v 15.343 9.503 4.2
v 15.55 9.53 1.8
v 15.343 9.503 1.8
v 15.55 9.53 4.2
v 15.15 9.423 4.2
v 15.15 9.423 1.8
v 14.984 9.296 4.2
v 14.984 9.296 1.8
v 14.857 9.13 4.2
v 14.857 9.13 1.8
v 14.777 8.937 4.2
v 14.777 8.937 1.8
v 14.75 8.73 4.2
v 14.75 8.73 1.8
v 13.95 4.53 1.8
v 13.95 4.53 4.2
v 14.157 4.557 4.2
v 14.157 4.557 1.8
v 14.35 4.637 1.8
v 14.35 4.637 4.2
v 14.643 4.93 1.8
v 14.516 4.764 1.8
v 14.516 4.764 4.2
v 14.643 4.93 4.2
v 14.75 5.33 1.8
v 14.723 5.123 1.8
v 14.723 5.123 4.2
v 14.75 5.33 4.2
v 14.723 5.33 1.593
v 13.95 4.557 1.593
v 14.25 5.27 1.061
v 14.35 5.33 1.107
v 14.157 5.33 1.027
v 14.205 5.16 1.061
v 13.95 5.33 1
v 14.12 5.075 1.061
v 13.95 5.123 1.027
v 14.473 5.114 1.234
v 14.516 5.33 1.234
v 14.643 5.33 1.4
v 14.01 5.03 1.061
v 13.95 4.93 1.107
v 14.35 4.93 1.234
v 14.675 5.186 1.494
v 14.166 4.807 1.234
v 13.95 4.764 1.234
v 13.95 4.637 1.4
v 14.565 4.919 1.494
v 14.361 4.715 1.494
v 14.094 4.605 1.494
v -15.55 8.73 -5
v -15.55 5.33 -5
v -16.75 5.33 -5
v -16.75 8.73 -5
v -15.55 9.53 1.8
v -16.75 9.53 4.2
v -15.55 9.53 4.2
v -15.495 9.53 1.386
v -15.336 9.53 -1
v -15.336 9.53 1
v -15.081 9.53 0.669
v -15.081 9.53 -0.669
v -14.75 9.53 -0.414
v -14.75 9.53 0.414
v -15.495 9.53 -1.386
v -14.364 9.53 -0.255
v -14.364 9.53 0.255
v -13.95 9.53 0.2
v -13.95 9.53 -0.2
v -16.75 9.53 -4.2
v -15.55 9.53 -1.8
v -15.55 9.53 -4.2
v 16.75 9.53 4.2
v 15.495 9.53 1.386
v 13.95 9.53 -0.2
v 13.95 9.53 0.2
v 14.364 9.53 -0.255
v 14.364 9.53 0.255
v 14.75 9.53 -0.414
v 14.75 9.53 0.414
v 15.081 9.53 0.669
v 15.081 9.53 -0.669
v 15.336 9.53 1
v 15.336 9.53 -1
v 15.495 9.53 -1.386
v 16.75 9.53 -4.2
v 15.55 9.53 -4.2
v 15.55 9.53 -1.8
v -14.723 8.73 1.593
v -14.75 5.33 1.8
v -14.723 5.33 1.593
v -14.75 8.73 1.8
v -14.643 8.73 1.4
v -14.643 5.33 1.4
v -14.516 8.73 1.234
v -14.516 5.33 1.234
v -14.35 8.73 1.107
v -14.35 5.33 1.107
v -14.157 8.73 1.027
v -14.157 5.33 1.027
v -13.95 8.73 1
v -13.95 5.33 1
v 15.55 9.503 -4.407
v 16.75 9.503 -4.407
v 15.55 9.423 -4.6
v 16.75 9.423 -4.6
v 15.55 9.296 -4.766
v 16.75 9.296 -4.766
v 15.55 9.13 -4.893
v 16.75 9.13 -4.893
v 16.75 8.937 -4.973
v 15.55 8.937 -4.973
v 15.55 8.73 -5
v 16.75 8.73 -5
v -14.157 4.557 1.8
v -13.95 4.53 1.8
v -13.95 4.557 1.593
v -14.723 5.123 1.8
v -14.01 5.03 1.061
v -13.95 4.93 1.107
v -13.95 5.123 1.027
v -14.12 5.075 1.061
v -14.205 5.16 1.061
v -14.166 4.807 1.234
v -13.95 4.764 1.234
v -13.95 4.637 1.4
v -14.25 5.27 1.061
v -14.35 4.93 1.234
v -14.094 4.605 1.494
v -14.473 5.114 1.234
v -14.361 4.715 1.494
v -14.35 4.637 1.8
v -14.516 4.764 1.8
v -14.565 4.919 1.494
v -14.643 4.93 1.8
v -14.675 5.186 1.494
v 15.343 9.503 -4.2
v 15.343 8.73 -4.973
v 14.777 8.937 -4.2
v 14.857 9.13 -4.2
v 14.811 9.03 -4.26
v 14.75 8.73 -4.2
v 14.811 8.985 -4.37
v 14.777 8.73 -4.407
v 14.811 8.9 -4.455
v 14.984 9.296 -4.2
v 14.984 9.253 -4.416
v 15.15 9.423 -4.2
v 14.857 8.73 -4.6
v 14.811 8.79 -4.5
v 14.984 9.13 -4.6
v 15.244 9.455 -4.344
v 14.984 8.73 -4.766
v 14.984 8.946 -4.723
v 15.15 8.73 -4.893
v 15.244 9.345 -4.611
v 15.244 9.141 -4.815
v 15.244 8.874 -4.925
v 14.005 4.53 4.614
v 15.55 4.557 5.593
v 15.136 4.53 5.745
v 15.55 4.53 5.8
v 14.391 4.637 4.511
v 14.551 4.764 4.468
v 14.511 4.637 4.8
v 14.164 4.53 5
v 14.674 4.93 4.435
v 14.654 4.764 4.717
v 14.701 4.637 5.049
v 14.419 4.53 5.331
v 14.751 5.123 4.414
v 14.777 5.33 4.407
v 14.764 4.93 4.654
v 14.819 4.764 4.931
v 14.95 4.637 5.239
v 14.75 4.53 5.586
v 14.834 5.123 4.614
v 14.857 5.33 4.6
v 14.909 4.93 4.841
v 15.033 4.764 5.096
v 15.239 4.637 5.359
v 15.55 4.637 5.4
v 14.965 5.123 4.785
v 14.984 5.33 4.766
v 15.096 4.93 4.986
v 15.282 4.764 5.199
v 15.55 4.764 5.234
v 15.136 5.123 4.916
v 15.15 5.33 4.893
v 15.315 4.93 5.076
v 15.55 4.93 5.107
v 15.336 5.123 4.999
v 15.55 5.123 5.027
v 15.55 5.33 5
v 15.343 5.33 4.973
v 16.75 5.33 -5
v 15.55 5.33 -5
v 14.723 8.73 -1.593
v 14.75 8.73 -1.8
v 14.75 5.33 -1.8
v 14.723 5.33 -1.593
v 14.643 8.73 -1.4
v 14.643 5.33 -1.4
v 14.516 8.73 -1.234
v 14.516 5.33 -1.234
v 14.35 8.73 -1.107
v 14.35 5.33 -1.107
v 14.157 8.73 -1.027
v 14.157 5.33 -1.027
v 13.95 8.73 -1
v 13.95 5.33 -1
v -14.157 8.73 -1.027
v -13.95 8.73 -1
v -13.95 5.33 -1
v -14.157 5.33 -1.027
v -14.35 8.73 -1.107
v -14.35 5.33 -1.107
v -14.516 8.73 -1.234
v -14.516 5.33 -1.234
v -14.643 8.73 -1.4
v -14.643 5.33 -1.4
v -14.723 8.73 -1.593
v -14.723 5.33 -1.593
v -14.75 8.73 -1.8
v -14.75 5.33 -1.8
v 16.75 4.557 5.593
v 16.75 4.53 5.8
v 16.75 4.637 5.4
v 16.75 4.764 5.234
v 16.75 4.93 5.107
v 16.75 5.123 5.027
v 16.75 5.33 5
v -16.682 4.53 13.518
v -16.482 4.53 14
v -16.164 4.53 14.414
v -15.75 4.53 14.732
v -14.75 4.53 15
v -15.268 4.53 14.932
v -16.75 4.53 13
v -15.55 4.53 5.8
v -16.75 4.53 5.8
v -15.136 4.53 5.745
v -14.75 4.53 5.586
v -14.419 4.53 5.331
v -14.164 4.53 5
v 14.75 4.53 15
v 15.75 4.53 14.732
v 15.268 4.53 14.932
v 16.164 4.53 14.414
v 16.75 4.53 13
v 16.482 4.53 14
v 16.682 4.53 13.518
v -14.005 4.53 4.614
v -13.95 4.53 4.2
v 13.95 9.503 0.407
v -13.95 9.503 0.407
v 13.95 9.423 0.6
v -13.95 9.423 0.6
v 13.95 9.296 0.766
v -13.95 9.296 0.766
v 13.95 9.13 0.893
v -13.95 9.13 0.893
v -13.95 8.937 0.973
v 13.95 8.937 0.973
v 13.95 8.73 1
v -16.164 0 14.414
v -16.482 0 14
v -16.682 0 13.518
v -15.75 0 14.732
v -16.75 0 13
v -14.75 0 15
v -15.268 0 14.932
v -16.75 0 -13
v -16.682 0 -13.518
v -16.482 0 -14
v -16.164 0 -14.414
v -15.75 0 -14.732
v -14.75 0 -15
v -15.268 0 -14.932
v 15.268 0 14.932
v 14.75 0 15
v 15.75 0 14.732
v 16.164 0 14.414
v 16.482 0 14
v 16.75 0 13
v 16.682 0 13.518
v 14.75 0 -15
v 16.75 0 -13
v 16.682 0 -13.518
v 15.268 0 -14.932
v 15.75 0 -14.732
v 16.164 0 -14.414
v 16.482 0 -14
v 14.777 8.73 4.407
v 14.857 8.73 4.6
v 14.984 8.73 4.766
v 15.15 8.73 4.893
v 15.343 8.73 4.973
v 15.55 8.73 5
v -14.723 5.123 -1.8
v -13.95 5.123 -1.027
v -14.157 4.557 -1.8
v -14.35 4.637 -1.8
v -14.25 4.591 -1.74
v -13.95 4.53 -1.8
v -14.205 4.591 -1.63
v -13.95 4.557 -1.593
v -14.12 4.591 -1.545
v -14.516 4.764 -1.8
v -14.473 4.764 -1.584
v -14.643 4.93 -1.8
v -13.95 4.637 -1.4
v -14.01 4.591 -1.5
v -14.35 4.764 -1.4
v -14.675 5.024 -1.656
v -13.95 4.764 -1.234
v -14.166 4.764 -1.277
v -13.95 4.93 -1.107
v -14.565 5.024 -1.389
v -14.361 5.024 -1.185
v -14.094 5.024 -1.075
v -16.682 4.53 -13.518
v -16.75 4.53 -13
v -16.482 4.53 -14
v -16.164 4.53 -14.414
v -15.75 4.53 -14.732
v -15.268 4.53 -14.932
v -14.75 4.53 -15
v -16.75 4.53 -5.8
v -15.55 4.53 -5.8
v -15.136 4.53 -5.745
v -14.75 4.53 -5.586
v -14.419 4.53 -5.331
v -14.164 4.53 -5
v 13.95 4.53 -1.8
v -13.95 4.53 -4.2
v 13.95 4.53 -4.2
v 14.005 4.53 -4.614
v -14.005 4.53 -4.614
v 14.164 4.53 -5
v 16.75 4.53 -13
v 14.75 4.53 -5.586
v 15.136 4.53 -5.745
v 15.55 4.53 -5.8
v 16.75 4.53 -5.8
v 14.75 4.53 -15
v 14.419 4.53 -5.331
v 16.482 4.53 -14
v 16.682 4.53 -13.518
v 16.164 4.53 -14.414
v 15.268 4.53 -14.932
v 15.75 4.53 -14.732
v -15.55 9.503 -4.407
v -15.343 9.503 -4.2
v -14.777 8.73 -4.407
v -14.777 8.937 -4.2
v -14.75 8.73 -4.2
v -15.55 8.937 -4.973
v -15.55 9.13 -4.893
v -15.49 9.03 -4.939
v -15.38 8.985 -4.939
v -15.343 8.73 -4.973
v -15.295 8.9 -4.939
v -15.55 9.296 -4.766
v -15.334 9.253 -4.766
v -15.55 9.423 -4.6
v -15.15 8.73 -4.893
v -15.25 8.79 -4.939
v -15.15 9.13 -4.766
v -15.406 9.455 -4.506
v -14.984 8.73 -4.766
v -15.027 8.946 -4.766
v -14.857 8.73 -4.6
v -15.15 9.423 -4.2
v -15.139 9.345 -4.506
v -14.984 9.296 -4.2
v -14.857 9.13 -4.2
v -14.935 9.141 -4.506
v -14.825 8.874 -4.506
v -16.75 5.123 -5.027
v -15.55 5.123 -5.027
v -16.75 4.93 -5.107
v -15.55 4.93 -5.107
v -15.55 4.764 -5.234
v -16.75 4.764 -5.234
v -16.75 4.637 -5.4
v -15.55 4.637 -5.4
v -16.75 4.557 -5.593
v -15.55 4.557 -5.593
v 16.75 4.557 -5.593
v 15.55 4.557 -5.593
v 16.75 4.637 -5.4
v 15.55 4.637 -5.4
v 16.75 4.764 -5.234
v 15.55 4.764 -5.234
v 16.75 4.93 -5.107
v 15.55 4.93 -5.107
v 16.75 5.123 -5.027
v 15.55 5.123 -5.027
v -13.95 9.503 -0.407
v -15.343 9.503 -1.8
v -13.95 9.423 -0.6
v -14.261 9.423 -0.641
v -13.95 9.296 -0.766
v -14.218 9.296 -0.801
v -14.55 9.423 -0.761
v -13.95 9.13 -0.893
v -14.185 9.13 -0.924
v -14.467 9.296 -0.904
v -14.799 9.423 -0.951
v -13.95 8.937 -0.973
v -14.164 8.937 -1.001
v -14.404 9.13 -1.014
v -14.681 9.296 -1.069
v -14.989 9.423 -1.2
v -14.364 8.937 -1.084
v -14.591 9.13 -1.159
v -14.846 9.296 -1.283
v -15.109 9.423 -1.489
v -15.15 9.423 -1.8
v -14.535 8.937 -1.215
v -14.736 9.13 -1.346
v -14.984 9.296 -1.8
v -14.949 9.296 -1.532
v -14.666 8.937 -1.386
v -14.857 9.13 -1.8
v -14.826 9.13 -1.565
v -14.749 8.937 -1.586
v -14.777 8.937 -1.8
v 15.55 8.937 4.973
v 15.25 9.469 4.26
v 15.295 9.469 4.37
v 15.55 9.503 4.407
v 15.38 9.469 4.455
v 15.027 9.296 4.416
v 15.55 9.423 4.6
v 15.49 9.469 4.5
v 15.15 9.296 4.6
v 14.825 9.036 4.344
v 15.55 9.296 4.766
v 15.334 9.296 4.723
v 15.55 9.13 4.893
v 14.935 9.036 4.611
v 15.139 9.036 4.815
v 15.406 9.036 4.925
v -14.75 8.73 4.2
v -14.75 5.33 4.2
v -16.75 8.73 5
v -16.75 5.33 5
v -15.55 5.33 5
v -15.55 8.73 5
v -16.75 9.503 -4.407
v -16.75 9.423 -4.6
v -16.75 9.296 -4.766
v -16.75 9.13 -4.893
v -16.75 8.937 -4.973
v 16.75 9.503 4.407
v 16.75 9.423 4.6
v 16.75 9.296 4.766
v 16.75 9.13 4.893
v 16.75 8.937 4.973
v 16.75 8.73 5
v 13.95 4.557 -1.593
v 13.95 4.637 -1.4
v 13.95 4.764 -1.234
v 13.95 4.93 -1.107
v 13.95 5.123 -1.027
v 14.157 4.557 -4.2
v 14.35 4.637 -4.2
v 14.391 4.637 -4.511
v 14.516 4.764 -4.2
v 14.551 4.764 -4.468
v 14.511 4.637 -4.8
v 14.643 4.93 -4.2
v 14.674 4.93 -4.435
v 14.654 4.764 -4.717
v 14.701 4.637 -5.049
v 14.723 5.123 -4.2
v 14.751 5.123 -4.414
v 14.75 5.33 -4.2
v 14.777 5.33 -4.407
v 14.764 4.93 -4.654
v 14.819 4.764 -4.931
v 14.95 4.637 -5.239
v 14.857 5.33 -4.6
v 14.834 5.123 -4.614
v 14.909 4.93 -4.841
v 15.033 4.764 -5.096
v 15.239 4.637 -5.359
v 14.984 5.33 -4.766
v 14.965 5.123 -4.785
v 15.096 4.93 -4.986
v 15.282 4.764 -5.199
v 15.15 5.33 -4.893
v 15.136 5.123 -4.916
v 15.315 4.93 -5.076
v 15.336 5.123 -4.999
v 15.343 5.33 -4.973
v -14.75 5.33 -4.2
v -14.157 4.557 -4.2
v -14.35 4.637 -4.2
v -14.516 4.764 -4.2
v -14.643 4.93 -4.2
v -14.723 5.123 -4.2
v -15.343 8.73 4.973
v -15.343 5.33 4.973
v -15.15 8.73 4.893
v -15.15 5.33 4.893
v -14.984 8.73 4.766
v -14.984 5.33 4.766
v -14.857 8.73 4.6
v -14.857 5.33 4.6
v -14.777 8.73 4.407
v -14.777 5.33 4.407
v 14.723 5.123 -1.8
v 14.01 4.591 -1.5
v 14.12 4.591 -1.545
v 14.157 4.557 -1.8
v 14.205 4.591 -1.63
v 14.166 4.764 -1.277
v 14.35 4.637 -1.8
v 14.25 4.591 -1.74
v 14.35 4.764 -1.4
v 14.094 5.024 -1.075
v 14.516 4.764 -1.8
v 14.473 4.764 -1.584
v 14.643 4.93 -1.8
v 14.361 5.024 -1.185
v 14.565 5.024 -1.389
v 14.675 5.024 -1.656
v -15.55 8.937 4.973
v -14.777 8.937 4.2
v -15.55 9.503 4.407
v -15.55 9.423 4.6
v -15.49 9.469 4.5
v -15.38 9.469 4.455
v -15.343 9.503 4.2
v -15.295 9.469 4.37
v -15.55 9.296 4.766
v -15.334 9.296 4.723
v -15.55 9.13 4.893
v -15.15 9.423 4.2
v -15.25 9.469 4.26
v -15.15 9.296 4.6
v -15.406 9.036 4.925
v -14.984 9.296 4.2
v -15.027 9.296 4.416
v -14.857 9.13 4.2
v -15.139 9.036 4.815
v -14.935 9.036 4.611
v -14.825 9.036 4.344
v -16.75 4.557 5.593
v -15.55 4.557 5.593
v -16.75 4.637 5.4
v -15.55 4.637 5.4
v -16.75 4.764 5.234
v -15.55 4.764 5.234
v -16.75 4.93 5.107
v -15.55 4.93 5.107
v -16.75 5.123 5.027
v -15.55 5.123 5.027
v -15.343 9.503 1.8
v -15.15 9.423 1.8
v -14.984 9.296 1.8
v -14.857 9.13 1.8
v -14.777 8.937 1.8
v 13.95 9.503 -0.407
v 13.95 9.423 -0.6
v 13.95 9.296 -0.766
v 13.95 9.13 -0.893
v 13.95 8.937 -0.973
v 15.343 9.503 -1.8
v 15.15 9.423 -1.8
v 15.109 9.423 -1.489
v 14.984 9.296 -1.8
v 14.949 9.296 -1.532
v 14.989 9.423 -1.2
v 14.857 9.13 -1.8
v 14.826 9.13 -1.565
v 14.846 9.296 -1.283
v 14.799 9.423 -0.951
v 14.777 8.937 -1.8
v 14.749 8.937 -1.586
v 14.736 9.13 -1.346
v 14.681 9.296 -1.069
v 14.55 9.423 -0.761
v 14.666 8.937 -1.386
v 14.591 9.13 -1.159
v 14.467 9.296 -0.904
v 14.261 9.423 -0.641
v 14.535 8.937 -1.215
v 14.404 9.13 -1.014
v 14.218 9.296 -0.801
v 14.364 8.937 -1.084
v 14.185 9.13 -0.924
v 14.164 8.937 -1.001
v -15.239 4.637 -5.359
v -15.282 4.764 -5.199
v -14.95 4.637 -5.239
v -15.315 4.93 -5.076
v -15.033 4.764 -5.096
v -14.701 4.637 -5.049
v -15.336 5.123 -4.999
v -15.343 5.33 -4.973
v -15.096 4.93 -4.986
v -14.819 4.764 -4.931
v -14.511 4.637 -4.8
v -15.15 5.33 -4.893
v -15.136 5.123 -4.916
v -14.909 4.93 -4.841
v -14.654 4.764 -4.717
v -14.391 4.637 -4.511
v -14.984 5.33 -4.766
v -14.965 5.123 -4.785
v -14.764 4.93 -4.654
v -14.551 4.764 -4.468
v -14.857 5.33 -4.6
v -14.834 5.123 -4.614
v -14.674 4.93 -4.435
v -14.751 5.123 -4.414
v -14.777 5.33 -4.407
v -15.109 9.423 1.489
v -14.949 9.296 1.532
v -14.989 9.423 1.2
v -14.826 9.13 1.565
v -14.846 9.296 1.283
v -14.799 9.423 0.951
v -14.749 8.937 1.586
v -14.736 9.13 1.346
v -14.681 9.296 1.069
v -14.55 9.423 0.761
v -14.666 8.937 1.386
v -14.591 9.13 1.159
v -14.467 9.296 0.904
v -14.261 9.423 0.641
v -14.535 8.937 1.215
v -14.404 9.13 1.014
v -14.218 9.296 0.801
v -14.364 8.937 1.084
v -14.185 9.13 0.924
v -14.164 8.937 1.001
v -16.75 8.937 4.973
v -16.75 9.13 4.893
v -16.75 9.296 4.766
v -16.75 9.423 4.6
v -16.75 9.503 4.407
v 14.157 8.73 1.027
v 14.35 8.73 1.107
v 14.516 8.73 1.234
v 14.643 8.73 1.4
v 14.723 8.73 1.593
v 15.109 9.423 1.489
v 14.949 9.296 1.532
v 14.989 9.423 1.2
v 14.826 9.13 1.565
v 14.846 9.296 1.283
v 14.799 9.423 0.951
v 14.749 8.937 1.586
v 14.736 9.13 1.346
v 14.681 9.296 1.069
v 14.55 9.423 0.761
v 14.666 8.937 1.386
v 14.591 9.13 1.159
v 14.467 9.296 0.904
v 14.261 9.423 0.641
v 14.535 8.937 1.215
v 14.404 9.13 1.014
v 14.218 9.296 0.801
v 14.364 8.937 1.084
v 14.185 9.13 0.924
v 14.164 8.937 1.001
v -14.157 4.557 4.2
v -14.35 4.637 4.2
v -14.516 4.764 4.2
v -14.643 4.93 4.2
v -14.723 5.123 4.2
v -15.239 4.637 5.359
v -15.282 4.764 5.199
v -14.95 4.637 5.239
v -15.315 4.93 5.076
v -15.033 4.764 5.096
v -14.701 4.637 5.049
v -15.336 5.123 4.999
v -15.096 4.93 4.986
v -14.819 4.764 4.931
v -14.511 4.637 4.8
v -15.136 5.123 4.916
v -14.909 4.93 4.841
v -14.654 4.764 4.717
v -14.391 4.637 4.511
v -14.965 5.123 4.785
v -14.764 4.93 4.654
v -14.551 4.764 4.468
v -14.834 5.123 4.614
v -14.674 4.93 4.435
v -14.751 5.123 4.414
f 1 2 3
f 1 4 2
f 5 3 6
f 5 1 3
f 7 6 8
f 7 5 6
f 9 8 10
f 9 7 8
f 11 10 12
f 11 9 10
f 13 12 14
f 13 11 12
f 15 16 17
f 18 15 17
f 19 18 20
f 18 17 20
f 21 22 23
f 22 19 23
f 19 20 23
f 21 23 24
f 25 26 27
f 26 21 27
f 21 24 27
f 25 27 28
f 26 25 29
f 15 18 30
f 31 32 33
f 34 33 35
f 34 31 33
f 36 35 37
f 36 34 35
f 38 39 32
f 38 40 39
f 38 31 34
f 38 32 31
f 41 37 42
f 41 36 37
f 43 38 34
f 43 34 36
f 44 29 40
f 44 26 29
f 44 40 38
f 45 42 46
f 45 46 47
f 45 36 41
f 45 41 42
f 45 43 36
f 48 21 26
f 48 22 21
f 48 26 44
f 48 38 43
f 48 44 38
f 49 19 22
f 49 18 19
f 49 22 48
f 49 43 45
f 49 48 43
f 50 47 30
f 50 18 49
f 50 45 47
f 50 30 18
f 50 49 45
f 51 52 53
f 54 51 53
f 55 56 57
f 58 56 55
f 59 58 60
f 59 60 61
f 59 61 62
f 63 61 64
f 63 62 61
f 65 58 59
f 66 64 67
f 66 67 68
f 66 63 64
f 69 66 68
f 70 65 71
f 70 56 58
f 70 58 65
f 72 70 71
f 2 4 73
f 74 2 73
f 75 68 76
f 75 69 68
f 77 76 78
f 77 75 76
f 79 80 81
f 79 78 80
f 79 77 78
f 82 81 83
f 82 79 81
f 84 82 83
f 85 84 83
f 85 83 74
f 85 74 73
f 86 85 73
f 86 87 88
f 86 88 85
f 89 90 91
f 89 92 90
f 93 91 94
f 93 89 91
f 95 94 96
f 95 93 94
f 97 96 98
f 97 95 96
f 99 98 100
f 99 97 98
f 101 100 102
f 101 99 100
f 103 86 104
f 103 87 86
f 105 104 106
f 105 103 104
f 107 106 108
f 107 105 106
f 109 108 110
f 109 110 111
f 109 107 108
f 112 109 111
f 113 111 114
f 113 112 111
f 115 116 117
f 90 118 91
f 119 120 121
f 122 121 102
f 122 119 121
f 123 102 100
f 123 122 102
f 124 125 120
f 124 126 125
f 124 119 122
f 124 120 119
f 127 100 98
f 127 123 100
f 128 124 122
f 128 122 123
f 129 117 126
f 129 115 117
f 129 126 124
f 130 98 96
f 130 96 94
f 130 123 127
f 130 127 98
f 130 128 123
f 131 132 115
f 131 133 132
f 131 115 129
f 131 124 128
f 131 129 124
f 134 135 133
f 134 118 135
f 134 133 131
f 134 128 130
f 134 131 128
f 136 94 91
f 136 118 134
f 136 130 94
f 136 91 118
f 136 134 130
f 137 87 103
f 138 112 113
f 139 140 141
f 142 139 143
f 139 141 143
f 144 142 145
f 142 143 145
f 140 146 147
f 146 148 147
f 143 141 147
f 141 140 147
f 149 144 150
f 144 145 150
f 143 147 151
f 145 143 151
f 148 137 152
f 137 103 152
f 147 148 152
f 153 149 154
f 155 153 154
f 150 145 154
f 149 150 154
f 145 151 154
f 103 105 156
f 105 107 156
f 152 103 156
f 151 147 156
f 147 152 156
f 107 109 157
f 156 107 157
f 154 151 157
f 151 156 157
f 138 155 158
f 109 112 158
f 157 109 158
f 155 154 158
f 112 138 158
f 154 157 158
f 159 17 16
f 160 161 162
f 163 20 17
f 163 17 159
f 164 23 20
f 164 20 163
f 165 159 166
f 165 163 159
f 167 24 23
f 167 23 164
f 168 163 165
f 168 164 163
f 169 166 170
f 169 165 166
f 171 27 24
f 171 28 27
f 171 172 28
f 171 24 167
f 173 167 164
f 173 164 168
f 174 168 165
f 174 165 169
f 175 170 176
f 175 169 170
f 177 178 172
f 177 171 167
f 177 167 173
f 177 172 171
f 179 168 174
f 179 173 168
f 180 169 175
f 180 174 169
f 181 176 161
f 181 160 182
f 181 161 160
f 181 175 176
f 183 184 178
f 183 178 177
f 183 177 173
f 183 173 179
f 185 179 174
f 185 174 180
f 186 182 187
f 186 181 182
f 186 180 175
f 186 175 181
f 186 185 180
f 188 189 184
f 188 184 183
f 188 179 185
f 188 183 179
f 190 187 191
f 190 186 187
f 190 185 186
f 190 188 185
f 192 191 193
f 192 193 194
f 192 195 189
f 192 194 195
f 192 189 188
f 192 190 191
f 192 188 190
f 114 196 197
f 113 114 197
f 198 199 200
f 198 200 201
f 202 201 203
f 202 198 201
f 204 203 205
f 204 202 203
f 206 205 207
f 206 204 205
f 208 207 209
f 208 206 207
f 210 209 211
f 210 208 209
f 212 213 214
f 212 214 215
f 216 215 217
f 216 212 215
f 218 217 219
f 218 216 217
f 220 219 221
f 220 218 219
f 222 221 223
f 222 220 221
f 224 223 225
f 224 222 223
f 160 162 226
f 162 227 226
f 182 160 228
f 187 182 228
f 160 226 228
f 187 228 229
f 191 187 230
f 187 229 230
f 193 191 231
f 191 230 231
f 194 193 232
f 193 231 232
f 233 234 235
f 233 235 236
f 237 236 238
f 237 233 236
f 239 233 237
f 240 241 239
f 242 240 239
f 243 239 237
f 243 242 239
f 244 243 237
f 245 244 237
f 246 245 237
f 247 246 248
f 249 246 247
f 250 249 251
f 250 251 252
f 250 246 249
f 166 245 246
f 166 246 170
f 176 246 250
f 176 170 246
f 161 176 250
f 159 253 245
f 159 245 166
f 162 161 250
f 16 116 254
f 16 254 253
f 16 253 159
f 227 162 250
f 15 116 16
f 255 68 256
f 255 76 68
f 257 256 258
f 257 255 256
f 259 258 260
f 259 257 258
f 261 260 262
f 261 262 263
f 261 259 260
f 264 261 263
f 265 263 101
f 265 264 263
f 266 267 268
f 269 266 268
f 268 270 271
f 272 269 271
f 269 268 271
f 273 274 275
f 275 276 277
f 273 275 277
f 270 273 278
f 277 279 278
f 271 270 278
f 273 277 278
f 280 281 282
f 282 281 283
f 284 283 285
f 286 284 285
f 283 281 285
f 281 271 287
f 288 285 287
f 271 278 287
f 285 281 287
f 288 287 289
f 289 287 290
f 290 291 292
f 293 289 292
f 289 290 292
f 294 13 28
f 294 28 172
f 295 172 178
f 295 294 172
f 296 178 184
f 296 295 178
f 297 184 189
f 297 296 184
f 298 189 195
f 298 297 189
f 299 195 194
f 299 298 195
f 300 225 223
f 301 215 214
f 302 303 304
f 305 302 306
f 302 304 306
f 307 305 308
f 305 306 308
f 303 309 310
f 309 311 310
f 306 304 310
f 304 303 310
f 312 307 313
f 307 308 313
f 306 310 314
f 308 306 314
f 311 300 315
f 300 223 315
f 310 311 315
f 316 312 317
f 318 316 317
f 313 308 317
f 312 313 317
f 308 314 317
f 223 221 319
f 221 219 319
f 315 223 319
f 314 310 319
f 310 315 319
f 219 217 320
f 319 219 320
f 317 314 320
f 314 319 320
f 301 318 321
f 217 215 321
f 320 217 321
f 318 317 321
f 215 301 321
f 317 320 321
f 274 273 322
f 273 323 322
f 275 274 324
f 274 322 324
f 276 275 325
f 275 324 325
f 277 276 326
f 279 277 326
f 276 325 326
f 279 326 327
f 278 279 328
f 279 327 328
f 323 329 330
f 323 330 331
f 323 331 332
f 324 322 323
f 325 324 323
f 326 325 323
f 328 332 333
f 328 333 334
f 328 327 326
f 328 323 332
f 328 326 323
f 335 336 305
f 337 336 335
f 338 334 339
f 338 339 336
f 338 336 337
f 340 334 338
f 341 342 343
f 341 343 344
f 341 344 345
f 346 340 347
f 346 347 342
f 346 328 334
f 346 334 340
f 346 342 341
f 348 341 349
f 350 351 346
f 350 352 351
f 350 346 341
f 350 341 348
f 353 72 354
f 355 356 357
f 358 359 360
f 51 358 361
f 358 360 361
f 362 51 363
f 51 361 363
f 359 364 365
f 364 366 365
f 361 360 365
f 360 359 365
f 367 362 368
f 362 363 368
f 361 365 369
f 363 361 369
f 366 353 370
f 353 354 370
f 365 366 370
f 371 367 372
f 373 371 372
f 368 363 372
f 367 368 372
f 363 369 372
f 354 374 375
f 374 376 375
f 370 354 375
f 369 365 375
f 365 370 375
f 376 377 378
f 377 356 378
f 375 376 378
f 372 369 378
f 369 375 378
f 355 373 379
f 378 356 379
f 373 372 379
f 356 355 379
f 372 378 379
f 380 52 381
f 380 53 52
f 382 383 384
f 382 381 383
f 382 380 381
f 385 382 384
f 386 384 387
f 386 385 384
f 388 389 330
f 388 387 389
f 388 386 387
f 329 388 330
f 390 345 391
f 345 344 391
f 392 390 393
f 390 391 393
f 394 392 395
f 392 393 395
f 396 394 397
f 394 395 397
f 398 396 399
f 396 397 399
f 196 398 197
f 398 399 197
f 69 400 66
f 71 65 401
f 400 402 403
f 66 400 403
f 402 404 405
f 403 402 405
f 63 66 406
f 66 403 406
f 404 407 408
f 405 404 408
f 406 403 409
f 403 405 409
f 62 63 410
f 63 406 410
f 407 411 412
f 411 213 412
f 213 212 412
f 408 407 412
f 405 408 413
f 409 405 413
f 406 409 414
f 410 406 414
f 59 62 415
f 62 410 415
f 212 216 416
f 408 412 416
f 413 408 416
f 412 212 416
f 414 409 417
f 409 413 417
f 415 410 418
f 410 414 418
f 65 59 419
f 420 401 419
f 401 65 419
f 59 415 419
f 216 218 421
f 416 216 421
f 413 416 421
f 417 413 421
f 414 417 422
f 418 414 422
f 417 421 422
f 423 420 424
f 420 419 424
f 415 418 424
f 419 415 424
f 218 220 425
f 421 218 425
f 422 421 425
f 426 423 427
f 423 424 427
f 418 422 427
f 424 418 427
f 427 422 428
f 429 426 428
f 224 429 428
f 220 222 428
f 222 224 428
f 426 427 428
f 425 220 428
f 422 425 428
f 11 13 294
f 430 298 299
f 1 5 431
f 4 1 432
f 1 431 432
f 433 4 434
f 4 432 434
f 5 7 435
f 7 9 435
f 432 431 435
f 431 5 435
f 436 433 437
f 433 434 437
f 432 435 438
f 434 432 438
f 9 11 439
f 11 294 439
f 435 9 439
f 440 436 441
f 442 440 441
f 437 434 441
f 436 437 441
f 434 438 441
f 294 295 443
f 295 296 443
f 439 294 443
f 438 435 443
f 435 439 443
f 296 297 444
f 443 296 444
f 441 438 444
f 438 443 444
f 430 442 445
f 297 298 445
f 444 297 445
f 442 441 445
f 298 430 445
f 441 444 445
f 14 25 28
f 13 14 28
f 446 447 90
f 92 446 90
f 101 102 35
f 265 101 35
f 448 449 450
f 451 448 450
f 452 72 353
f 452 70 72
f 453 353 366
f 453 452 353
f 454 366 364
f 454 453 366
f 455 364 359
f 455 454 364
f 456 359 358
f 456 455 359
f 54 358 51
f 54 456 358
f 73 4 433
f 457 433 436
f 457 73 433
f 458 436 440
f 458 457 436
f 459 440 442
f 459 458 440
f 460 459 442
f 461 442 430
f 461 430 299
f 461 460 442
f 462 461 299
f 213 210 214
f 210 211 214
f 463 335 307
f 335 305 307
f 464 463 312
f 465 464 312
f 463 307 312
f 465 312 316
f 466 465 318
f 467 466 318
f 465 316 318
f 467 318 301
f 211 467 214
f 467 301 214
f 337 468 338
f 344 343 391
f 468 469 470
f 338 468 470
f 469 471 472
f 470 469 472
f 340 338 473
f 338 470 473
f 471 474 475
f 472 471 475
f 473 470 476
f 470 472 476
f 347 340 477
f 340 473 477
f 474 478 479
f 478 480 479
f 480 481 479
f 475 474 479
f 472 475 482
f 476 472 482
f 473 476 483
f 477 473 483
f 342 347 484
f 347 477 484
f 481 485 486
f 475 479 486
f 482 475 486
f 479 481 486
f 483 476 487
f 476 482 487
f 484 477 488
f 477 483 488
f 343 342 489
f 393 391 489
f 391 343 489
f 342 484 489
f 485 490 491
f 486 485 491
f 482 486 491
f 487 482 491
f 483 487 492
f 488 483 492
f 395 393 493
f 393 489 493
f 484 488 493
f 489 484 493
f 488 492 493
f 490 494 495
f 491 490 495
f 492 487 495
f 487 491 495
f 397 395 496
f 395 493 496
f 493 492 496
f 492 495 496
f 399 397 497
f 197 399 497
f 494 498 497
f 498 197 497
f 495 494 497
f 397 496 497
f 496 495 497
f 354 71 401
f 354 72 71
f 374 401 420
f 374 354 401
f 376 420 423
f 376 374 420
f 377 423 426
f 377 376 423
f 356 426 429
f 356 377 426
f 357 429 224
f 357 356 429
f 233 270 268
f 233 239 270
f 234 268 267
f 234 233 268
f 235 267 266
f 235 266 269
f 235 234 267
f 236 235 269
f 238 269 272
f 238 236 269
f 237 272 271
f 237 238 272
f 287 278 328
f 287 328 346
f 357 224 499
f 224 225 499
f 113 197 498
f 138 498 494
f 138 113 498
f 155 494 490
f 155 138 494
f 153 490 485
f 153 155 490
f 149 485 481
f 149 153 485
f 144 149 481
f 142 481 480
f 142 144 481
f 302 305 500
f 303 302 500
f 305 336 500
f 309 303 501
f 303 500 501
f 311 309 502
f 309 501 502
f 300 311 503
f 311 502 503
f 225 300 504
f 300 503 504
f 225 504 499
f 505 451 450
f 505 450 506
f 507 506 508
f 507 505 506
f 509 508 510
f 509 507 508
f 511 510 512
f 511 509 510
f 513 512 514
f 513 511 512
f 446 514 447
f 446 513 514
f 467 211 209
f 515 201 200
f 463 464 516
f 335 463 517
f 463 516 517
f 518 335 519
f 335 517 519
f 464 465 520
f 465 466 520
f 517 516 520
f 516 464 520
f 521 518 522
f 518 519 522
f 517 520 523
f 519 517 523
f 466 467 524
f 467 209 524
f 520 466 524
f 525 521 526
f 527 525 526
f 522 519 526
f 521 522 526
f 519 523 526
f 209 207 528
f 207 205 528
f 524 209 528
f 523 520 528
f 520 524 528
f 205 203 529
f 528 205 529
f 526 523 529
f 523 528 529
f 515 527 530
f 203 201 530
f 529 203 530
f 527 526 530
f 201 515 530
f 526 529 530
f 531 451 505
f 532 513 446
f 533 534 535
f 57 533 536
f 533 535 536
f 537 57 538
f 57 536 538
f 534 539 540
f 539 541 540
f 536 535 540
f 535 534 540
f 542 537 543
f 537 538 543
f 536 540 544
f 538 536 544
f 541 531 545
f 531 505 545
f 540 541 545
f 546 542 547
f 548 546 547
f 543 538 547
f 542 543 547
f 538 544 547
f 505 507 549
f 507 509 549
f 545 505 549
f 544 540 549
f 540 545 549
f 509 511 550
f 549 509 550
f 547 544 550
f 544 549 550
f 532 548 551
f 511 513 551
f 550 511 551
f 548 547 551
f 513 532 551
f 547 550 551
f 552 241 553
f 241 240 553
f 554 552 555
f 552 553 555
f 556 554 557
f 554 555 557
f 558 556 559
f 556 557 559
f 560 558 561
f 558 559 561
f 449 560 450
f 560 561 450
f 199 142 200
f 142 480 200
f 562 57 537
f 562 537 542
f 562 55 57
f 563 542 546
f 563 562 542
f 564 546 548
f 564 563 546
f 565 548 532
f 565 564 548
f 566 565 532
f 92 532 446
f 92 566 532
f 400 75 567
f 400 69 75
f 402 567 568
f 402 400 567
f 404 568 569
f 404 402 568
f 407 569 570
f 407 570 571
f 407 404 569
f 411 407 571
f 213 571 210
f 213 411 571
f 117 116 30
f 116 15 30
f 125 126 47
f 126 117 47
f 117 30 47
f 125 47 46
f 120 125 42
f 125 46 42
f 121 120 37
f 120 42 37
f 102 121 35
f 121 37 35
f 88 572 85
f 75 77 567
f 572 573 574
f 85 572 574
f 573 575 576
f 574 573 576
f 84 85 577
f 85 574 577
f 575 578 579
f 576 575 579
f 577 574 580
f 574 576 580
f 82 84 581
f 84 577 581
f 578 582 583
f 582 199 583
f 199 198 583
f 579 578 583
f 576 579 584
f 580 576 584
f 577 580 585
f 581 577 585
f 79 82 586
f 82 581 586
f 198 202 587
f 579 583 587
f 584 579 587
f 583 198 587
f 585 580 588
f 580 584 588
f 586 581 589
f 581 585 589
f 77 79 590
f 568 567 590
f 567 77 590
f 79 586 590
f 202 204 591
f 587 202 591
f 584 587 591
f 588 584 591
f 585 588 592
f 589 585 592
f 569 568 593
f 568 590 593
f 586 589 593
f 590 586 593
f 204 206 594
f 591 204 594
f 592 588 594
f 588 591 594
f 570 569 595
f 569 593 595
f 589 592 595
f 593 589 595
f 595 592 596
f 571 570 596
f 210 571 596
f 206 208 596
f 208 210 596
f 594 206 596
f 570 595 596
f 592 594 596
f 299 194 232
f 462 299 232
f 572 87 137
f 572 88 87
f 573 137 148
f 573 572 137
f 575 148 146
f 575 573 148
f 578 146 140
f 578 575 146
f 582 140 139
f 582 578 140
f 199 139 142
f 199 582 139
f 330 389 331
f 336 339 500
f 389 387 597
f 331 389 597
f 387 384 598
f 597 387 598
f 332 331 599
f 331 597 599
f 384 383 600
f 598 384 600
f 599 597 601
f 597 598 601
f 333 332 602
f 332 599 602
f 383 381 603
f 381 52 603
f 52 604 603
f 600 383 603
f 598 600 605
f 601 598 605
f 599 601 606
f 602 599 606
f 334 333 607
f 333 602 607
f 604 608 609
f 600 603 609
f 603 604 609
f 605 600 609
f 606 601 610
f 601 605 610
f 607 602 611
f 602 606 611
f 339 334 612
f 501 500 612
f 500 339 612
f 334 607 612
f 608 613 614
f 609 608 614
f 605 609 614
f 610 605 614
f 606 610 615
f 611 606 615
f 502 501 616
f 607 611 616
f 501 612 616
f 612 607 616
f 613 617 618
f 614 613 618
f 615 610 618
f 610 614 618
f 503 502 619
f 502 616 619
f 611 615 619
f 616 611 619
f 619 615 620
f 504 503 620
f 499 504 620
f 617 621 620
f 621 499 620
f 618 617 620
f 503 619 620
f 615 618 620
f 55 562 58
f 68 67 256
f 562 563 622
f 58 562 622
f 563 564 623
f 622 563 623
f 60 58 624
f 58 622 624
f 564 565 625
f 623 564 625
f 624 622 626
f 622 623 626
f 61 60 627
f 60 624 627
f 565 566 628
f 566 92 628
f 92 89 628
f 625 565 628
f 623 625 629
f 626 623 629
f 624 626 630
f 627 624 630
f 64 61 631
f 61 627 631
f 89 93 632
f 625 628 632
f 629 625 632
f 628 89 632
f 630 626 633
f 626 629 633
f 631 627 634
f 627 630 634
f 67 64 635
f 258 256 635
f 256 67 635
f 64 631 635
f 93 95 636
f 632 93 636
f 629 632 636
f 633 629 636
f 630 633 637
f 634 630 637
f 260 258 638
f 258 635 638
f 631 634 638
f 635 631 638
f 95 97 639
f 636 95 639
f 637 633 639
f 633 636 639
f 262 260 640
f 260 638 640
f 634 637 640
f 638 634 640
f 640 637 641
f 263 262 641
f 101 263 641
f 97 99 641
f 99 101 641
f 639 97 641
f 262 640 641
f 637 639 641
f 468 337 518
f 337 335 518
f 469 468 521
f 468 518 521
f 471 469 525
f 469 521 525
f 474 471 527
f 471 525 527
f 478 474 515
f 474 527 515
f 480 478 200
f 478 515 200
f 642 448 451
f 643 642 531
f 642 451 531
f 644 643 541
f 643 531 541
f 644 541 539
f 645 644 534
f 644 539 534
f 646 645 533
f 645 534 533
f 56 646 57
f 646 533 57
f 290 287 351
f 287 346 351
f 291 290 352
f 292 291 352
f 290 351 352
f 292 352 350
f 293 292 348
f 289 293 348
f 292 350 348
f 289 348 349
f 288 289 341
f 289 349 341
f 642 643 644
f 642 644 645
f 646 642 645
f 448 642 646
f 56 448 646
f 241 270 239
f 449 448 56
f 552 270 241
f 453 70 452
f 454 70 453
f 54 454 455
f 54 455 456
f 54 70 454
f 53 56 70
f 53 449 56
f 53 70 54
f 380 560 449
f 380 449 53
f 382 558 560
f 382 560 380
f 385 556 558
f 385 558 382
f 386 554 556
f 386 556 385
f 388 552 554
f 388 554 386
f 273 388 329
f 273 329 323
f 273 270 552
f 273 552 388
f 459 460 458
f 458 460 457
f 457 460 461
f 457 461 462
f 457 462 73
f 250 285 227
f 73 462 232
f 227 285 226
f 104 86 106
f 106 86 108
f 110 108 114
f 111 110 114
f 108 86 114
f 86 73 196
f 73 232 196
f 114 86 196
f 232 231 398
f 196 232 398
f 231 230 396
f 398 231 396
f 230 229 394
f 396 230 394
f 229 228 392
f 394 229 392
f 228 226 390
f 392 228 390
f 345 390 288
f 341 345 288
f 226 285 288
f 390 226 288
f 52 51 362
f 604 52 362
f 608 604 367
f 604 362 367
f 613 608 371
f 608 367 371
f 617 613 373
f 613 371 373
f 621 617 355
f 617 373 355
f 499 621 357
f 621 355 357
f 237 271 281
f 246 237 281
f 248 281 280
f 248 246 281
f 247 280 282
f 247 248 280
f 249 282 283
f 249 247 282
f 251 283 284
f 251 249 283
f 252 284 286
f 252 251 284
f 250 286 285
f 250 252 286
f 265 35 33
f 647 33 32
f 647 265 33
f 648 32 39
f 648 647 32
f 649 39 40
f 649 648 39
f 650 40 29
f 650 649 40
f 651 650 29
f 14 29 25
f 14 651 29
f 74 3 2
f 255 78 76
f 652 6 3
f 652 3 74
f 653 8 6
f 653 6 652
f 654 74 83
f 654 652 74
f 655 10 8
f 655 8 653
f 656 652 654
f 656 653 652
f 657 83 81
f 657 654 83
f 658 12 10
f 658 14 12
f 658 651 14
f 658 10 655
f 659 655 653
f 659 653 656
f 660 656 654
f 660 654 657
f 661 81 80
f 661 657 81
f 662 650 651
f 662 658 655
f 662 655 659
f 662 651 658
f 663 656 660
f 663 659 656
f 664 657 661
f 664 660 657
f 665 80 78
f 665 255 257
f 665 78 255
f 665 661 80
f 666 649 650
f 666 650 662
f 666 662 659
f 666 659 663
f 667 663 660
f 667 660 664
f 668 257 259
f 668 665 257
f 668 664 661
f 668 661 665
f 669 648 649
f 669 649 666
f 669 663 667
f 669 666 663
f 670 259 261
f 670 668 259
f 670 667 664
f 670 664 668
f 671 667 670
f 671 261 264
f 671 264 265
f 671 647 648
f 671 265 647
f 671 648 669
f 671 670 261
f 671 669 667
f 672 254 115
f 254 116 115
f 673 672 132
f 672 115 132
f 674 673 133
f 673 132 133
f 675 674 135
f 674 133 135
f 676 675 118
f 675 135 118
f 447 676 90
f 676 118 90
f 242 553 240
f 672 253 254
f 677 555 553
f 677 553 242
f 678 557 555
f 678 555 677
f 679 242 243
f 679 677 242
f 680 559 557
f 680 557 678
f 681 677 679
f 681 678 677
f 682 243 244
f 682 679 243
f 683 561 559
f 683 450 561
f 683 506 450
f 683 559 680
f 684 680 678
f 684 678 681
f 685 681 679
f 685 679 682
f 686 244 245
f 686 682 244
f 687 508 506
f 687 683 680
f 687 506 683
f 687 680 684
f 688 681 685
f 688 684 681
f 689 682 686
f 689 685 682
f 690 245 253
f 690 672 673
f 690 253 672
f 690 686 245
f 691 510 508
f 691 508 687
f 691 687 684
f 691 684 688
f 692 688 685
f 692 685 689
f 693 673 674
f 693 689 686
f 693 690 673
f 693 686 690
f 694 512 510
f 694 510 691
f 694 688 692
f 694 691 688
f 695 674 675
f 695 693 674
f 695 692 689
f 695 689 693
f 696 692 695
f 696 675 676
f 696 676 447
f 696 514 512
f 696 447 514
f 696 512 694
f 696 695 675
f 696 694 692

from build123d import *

# Parameters (mm, degrees)
SKETCH1_W           = 33.5
SKETCH1_H           = 30
BOSS_EXTRUDE1_DEPTH = 4.53
BOSS_EXTRUDE2_DEPTH = 5
FILLET1_R           = 2
FILLET3_R           = 0.8


with BuildPart() as part:
    # Sketch1 → Boss-Extrude1 (new body)
    with BuildSketch(Plane(origin=(0, 0, 0), x_dir=(1, 0, 0), z_dir=(0, 1, 0))):
        Rectangle(SKETCH1_W, SKETCH1_H)
    extrude(amount=BOSS_EXTRUDE1_DEPTH)

    # Sketch2 → Boss-Extrude2 (add)
    with BuildSketch(Plane(origin=(0, 4.53, 0), x_dir=(1, 0, 0), z_dir=(0, 1, 0))):
        Polygon((-14.75, 5), (-16.75, 5), (-16.75, -5), (-14.75, -5), (-14.75, -1), (14.75, -1), (14.75, -5), (16.75, -5), (16.75, 5), (14.75, 5), (14.75, 1), (-14.75, 1), align=None)
    extrude(amount=BOSS_EXTRUDE2_DEPTH)

    # Fillet1
    fillet1_edges = [part.edges().sort_by_distance(p)[0] for p in [
        (16.75, 2.265, 15),
        (-16.75, 2.265, 15),
        (-16.75, 2.265, -15),
        (16.75, 2.265, -15),
    ]]
    fillet(fillet1_edges, radius=FILLET1_R)

    # Fillet3
    fillet3_edges = [part.edges().sort_by_distance(p)[0] for p in [
        (14.75, 4.53, 3),
        (14.75, 7.03, 1),
        (15.75, 4.53, 5),
        (14.75, 7.03, 5),
        (15.75, 9.53, -5),
        (14.75, 9.53, -3),
        (14.75, 7.03, -5),
        (0, 9.53, -1),
        (14.75, 7.03, -1),
        (-14.75, 9.53, -3),
        (-14.75, 7.03, -1),
        (-15.75, 9.53, -5),
        (-14.75, 7.03, -5),
        (-15.75, 4.53, 5),
        (-14.75, 4.53, 3),
        (-14.75, 7.03, 5),
        (0, 4.53, 1),
        (-14.75, 7.03, 1),
        (14.75, 9.53, 3),
        (15.75, 9.53, 5),
        (-15.75, 9.53, 5),
        (-14.75, 9.53, 3),
        (0, 9.53, 1),
        (-15.75, 4.53, -5),
        (-14.75, 4.53, -3),
        (0, 4.53, -1),
        (14.75, 4.53, -3),
        (15.75, 4.53, -5),
    ]]
    fillet(fillet3_edges, radius=FILLET3_R)


solid = part.part
